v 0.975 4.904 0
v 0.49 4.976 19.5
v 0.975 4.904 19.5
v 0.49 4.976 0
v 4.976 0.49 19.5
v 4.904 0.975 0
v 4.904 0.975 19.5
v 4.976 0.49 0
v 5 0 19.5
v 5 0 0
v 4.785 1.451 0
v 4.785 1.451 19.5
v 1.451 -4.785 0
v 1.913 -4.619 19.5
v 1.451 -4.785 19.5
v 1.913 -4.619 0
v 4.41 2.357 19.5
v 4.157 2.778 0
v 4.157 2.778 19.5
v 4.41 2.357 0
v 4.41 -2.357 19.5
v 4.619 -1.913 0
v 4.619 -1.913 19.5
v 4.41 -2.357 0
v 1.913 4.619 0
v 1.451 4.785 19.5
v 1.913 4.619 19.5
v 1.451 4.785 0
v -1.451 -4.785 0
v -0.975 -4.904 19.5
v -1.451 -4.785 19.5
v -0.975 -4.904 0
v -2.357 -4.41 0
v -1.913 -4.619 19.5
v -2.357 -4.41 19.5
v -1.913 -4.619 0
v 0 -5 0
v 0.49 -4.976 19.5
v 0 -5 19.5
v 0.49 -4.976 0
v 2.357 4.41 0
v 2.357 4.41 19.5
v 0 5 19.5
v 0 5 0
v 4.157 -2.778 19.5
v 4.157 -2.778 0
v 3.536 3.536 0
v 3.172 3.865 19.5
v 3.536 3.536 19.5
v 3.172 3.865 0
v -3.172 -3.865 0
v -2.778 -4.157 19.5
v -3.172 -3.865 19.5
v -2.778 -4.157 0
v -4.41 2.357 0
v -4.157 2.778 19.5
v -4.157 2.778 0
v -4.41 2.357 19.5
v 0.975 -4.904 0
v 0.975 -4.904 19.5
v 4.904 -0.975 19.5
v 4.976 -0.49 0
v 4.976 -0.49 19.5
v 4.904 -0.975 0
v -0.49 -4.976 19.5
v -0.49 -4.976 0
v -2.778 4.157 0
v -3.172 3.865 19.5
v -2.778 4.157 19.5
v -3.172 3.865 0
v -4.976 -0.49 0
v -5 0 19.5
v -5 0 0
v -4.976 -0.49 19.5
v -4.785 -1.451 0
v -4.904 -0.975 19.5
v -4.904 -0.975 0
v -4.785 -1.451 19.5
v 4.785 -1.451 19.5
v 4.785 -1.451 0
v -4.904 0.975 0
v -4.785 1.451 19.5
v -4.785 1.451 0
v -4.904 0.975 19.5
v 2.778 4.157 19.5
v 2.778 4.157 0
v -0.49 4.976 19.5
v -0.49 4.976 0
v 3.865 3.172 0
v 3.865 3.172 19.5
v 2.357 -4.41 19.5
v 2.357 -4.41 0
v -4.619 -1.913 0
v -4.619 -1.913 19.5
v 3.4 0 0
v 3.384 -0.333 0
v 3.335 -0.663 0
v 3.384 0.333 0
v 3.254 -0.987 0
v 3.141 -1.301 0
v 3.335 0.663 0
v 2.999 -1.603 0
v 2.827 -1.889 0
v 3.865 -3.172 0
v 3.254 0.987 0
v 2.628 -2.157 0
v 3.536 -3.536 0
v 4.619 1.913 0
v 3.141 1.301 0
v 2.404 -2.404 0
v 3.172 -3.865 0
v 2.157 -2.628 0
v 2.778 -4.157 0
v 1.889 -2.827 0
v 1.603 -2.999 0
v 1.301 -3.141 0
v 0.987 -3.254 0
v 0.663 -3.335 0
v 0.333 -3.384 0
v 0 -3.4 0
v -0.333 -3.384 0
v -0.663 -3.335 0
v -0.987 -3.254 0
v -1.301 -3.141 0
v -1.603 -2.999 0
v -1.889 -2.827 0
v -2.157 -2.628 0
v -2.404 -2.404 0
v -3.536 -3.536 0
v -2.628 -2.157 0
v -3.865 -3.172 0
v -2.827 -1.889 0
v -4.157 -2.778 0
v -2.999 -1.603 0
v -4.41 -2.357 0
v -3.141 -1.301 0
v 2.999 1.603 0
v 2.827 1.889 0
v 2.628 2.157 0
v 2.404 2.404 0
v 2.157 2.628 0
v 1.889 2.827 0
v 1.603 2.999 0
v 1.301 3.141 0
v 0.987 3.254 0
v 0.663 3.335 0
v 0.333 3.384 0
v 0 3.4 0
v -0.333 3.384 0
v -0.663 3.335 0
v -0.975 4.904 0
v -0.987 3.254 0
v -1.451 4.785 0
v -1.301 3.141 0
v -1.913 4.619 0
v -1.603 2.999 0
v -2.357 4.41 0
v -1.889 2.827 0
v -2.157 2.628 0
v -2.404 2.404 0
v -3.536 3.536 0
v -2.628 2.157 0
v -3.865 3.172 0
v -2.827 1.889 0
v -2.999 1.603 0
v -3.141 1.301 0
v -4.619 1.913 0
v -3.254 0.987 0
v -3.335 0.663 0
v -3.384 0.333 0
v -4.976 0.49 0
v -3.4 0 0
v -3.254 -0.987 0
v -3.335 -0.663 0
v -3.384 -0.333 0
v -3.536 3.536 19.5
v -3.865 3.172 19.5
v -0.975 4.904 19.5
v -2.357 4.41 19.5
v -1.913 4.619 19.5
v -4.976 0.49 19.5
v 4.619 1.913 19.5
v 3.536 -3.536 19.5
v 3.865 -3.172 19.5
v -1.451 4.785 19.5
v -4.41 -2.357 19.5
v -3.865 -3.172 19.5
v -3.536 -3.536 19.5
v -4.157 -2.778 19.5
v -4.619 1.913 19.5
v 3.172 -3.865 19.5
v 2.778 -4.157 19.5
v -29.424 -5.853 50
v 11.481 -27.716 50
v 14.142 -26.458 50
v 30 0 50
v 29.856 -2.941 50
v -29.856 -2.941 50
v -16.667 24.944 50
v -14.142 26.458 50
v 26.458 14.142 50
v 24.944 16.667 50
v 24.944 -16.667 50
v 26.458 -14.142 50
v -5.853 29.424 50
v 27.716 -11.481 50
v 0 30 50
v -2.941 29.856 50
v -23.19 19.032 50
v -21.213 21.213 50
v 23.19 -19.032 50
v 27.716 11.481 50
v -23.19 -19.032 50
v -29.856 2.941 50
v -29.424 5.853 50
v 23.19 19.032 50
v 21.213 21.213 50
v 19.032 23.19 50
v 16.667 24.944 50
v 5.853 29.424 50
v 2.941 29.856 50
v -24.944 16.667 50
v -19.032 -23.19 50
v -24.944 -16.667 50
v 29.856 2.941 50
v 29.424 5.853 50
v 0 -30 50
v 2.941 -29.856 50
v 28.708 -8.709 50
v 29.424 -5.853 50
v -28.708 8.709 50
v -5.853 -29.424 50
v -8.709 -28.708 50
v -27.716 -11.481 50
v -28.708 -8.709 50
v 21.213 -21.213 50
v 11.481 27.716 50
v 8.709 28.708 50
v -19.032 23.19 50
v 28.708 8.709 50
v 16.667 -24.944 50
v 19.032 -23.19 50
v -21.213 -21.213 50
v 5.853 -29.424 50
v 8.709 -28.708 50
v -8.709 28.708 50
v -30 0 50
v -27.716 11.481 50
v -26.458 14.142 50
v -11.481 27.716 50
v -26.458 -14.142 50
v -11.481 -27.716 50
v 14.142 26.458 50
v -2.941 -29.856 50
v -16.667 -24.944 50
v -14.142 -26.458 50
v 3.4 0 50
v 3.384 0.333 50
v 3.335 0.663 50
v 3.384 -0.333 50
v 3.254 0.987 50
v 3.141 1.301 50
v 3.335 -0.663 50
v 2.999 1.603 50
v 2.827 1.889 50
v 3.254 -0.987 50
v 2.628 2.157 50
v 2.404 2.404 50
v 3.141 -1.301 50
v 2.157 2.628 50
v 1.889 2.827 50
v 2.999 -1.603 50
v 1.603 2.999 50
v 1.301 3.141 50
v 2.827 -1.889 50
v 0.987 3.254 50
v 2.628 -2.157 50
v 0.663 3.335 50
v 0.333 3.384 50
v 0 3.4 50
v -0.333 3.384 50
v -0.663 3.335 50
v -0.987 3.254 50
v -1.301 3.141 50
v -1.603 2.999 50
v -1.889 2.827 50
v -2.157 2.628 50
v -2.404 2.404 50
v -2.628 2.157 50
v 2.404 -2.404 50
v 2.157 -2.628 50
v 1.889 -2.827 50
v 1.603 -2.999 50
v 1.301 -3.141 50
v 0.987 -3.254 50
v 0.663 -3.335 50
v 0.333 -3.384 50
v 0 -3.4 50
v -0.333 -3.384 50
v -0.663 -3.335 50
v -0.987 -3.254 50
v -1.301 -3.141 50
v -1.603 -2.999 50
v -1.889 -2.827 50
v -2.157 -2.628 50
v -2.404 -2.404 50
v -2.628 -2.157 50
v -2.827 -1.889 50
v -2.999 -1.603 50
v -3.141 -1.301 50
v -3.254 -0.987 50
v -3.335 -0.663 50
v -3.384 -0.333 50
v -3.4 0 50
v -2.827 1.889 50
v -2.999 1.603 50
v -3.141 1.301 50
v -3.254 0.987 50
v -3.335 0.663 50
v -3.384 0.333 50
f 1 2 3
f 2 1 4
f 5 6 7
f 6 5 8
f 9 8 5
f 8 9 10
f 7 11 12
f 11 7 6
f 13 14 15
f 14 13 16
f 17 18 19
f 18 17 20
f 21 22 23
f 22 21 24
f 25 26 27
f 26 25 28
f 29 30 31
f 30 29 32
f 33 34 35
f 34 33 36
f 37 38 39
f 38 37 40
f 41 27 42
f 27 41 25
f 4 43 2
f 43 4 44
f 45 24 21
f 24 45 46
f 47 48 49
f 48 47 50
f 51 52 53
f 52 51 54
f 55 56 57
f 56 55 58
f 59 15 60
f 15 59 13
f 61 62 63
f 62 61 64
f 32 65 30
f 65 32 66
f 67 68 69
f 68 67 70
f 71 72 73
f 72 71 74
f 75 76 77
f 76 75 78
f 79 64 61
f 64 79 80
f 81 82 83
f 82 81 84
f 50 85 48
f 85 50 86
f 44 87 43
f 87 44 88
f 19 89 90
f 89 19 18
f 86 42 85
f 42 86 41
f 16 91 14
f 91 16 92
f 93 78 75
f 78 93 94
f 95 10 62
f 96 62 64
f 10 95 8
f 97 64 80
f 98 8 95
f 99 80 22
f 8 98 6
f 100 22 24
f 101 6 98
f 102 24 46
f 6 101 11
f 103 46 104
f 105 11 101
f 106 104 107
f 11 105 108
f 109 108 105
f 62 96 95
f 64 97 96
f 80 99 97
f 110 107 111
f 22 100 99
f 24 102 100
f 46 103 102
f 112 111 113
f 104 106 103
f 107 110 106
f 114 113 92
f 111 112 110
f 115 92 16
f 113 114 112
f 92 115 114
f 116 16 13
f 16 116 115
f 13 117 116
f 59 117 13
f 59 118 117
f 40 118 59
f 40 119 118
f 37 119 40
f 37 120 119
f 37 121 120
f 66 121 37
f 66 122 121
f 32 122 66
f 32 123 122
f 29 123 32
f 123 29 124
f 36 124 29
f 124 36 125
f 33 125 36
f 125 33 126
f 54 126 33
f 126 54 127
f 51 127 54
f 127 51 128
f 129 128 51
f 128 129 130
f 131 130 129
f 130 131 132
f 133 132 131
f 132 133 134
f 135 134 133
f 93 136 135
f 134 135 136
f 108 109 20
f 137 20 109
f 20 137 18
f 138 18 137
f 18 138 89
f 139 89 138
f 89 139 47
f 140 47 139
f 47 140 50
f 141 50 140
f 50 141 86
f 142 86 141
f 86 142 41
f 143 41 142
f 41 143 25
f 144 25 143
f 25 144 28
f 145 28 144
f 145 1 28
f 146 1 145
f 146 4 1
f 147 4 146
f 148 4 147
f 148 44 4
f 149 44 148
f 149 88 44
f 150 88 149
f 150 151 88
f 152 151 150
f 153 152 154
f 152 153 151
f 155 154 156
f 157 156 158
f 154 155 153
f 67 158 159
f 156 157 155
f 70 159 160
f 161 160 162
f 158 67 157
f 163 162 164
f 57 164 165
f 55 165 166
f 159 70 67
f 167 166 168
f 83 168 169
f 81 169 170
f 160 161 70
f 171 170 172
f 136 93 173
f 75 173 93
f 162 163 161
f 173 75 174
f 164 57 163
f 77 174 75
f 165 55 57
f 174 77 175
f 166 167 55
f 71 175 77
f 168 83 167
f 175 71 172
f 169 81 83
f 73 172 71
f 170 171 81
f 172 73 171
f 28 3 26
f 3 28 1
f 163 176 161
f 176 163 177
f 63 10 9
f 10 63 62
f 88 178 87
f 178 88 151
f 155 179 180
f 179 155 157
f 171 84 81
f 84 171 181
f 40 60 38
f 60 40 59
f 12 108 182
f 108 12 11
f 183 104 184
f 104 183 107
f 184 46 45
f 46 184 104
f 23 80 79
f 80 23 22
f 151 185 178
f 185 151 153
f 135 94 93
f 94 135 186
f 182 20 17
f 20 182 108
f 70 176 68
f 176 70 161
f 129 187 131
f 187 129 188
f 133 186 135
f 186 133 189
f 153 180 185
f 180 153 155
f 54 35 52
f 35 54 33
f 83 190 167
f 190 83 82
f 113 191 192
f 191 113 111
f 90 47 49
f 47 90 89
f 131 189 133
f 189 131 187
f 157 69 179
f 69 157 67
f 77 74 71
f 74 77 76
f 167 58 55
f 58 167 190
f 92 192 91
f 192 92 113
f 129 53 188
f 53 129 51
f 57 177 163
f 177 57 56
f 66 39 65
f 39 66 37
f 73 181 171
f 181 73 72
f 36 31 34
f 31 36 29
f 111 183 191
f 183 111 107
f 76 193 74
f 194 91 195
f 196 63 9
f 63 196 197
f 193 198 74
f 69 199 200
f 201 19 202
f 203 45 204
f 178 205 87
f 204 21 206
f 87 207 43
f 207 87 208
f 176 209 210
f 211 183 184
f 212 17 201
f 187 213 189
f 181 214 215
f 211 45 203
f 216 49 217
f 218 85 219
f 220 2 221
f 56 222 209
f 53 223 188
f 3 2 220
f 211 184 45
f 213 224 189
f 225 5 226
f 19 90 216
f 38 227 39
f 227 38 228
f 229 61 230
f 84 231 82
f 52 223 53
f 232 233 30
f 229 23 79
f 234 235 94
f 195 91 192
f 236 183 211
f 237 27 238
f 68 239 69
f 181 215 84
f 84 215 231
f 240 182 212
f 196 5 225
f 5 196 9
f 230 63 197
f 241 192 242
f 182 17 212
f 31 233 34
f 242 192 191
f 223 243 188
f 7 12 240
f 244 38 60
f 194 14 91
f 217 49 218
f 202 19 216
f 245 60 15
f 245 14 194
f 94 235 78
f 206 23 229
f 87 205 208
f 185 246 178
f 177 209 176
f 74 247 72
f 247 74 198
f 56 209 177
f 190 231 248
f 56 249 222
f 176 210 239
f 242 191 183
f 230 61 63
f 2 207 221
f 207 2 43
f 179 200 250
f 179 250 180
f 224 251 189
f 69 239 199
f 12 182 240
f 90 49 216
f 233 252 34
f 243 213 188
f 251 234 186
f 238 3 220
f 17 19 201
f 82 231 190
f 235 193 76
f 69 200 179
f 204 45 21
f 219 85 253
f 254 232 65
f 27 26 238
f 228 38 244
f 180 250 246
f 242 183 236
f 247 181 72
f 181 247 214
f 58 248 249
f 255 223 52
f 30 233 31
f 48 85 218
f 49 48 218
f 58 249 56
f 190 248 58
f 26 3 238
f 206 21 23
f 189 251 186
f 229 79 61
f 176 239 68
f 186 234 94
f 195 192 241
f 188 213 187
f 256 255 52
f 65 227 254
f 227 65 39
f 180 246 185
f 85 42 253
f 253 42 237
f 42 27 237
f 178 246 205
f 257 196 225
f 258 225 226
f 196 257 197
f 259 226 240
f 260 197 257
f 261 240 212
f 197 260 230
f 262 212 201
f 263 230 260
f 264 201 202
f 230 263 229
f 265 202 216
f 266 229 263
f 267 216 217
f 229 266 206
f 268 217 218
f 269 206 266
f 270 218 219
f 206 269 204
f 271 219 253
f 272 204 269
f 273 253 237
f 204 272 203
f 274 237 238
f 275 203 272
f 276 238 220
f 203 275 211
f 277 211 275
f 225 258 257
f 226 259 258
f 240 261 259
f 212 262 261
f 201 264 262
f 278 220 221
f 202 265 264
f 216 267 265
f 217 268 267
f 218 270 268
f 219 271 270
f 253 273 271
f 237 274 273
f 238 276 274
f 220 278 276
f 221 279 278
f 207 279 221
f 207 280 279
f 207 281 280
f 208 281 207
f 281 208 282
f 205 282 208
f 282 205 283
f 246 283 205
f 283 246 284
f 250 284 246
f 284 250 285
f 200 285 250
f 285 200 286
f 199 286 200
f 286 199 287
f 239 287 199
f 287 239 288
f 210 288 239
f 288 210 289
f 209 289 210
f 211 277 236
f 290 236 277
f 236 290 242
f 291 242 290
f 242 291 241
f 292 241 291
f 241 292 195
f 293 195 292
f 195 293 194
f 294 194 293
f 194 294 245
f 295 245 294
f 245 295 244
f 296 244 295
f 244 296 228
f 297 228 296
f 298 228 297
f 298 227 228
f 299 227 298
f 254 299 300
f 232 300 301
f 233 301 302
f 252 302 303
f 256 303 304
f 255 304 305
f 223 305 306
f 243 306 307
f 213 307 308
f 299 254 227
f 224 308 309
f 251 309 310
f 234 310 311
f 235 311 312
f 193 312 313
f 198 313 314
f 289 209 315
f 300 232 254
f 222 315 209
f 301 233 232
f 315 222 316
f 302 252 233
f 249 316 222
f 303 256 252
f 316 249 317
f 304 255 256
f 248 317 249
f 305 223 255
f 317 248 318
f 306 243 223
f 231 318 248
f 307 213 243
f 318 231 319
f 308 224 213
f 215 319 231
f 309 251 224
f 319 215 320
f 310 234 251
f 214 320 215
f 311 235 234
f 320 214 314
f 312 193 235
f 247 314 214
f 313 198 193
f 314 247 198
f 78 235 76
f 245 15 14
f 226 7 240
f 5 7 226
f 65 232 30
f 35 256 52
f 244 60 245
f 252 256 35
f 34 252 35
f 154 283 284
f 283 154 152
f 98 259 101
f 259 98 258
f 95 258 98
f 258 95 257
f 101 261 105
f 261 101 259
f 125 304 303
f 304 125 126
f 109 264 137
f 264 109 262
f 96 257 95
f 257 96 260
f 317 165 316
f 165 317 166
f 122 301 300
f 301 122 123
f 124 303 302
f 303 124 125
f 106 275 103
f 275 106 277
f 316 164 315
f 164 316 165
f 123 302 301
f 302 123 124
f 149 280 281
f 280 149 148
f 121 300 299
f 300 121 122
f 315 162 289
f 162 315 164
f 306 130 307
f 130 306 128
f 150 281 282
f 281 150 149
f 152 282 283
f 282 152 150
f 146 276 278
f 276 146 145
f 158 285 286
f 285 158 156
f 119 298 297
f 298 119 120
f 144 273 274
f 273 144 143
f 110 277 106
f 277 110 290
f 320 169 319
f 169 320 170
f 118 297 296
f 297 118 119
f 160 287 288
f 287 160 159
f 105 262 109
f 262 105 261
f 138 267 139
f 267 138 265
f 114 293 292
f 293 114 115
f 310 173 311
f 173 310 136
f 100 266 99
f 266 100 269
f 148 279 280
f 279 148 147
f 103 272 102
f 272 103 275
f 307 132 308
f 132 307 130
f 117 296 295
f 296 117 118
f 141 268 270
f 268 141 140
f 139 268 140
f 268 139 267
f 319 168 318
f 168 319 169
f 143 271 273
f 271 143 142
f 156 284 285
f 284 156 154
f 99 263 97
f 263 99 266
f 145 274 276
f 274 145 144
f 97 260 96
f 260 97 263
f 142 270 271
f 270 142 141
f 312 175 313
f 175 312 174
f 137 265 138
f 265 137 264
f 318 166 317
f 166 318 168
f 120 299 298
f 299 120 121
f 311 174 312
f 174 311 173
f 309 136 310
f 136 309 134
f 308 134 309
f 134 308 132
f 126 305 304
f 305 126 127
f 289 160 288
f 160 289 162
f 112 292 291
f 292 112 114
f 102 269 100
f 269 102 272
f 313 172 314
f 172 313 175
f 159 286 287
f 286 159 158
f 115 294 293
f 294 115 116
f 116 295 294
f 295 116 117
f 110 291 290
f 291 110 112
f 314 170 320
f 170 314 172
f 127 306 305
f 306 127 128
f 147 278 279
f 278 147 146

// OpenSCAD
// Lab funnel - printed upright, wide opening at the top
// Units: mm. Wall thickness 1.6 mm throughout.

$fn = 64;

// ---- Parameters ----
spout_od      = 10;    // outer diameter of spout
spout_id      = spout_od - 2 * 1.6;  // spout bore (6.8 mm)
spout_h       = 20;    // spout height (z = 0 .. 20)

cone_bottom_d = spout_od;  // cone outer diameter at z = 20
cone_top_d    = 60;    // cone rim outer diameter at z = 50
cone_h        = 50 - 20; // cone height (z = 20 .. 50)

eps           = 0.5;   // overlap for clean cuts

// ---- Model ----
difference() {
    union() {
        // Spout
        cylinder(h = spout_h, d = spout_od);

        // Cone: outer surface from spout diameter up to rim
        translate([0, 0, spout_h - eps])
            cylinder(h = cone_h + eps, d1 = cone_bottom_d, d2 = cone_top_d);
    }

    // Central bore through the full height
    translate([0, 0, -eps])
        cylinder(h = spout_h + cone_h + 2 * eps, d = spout_id);
}
